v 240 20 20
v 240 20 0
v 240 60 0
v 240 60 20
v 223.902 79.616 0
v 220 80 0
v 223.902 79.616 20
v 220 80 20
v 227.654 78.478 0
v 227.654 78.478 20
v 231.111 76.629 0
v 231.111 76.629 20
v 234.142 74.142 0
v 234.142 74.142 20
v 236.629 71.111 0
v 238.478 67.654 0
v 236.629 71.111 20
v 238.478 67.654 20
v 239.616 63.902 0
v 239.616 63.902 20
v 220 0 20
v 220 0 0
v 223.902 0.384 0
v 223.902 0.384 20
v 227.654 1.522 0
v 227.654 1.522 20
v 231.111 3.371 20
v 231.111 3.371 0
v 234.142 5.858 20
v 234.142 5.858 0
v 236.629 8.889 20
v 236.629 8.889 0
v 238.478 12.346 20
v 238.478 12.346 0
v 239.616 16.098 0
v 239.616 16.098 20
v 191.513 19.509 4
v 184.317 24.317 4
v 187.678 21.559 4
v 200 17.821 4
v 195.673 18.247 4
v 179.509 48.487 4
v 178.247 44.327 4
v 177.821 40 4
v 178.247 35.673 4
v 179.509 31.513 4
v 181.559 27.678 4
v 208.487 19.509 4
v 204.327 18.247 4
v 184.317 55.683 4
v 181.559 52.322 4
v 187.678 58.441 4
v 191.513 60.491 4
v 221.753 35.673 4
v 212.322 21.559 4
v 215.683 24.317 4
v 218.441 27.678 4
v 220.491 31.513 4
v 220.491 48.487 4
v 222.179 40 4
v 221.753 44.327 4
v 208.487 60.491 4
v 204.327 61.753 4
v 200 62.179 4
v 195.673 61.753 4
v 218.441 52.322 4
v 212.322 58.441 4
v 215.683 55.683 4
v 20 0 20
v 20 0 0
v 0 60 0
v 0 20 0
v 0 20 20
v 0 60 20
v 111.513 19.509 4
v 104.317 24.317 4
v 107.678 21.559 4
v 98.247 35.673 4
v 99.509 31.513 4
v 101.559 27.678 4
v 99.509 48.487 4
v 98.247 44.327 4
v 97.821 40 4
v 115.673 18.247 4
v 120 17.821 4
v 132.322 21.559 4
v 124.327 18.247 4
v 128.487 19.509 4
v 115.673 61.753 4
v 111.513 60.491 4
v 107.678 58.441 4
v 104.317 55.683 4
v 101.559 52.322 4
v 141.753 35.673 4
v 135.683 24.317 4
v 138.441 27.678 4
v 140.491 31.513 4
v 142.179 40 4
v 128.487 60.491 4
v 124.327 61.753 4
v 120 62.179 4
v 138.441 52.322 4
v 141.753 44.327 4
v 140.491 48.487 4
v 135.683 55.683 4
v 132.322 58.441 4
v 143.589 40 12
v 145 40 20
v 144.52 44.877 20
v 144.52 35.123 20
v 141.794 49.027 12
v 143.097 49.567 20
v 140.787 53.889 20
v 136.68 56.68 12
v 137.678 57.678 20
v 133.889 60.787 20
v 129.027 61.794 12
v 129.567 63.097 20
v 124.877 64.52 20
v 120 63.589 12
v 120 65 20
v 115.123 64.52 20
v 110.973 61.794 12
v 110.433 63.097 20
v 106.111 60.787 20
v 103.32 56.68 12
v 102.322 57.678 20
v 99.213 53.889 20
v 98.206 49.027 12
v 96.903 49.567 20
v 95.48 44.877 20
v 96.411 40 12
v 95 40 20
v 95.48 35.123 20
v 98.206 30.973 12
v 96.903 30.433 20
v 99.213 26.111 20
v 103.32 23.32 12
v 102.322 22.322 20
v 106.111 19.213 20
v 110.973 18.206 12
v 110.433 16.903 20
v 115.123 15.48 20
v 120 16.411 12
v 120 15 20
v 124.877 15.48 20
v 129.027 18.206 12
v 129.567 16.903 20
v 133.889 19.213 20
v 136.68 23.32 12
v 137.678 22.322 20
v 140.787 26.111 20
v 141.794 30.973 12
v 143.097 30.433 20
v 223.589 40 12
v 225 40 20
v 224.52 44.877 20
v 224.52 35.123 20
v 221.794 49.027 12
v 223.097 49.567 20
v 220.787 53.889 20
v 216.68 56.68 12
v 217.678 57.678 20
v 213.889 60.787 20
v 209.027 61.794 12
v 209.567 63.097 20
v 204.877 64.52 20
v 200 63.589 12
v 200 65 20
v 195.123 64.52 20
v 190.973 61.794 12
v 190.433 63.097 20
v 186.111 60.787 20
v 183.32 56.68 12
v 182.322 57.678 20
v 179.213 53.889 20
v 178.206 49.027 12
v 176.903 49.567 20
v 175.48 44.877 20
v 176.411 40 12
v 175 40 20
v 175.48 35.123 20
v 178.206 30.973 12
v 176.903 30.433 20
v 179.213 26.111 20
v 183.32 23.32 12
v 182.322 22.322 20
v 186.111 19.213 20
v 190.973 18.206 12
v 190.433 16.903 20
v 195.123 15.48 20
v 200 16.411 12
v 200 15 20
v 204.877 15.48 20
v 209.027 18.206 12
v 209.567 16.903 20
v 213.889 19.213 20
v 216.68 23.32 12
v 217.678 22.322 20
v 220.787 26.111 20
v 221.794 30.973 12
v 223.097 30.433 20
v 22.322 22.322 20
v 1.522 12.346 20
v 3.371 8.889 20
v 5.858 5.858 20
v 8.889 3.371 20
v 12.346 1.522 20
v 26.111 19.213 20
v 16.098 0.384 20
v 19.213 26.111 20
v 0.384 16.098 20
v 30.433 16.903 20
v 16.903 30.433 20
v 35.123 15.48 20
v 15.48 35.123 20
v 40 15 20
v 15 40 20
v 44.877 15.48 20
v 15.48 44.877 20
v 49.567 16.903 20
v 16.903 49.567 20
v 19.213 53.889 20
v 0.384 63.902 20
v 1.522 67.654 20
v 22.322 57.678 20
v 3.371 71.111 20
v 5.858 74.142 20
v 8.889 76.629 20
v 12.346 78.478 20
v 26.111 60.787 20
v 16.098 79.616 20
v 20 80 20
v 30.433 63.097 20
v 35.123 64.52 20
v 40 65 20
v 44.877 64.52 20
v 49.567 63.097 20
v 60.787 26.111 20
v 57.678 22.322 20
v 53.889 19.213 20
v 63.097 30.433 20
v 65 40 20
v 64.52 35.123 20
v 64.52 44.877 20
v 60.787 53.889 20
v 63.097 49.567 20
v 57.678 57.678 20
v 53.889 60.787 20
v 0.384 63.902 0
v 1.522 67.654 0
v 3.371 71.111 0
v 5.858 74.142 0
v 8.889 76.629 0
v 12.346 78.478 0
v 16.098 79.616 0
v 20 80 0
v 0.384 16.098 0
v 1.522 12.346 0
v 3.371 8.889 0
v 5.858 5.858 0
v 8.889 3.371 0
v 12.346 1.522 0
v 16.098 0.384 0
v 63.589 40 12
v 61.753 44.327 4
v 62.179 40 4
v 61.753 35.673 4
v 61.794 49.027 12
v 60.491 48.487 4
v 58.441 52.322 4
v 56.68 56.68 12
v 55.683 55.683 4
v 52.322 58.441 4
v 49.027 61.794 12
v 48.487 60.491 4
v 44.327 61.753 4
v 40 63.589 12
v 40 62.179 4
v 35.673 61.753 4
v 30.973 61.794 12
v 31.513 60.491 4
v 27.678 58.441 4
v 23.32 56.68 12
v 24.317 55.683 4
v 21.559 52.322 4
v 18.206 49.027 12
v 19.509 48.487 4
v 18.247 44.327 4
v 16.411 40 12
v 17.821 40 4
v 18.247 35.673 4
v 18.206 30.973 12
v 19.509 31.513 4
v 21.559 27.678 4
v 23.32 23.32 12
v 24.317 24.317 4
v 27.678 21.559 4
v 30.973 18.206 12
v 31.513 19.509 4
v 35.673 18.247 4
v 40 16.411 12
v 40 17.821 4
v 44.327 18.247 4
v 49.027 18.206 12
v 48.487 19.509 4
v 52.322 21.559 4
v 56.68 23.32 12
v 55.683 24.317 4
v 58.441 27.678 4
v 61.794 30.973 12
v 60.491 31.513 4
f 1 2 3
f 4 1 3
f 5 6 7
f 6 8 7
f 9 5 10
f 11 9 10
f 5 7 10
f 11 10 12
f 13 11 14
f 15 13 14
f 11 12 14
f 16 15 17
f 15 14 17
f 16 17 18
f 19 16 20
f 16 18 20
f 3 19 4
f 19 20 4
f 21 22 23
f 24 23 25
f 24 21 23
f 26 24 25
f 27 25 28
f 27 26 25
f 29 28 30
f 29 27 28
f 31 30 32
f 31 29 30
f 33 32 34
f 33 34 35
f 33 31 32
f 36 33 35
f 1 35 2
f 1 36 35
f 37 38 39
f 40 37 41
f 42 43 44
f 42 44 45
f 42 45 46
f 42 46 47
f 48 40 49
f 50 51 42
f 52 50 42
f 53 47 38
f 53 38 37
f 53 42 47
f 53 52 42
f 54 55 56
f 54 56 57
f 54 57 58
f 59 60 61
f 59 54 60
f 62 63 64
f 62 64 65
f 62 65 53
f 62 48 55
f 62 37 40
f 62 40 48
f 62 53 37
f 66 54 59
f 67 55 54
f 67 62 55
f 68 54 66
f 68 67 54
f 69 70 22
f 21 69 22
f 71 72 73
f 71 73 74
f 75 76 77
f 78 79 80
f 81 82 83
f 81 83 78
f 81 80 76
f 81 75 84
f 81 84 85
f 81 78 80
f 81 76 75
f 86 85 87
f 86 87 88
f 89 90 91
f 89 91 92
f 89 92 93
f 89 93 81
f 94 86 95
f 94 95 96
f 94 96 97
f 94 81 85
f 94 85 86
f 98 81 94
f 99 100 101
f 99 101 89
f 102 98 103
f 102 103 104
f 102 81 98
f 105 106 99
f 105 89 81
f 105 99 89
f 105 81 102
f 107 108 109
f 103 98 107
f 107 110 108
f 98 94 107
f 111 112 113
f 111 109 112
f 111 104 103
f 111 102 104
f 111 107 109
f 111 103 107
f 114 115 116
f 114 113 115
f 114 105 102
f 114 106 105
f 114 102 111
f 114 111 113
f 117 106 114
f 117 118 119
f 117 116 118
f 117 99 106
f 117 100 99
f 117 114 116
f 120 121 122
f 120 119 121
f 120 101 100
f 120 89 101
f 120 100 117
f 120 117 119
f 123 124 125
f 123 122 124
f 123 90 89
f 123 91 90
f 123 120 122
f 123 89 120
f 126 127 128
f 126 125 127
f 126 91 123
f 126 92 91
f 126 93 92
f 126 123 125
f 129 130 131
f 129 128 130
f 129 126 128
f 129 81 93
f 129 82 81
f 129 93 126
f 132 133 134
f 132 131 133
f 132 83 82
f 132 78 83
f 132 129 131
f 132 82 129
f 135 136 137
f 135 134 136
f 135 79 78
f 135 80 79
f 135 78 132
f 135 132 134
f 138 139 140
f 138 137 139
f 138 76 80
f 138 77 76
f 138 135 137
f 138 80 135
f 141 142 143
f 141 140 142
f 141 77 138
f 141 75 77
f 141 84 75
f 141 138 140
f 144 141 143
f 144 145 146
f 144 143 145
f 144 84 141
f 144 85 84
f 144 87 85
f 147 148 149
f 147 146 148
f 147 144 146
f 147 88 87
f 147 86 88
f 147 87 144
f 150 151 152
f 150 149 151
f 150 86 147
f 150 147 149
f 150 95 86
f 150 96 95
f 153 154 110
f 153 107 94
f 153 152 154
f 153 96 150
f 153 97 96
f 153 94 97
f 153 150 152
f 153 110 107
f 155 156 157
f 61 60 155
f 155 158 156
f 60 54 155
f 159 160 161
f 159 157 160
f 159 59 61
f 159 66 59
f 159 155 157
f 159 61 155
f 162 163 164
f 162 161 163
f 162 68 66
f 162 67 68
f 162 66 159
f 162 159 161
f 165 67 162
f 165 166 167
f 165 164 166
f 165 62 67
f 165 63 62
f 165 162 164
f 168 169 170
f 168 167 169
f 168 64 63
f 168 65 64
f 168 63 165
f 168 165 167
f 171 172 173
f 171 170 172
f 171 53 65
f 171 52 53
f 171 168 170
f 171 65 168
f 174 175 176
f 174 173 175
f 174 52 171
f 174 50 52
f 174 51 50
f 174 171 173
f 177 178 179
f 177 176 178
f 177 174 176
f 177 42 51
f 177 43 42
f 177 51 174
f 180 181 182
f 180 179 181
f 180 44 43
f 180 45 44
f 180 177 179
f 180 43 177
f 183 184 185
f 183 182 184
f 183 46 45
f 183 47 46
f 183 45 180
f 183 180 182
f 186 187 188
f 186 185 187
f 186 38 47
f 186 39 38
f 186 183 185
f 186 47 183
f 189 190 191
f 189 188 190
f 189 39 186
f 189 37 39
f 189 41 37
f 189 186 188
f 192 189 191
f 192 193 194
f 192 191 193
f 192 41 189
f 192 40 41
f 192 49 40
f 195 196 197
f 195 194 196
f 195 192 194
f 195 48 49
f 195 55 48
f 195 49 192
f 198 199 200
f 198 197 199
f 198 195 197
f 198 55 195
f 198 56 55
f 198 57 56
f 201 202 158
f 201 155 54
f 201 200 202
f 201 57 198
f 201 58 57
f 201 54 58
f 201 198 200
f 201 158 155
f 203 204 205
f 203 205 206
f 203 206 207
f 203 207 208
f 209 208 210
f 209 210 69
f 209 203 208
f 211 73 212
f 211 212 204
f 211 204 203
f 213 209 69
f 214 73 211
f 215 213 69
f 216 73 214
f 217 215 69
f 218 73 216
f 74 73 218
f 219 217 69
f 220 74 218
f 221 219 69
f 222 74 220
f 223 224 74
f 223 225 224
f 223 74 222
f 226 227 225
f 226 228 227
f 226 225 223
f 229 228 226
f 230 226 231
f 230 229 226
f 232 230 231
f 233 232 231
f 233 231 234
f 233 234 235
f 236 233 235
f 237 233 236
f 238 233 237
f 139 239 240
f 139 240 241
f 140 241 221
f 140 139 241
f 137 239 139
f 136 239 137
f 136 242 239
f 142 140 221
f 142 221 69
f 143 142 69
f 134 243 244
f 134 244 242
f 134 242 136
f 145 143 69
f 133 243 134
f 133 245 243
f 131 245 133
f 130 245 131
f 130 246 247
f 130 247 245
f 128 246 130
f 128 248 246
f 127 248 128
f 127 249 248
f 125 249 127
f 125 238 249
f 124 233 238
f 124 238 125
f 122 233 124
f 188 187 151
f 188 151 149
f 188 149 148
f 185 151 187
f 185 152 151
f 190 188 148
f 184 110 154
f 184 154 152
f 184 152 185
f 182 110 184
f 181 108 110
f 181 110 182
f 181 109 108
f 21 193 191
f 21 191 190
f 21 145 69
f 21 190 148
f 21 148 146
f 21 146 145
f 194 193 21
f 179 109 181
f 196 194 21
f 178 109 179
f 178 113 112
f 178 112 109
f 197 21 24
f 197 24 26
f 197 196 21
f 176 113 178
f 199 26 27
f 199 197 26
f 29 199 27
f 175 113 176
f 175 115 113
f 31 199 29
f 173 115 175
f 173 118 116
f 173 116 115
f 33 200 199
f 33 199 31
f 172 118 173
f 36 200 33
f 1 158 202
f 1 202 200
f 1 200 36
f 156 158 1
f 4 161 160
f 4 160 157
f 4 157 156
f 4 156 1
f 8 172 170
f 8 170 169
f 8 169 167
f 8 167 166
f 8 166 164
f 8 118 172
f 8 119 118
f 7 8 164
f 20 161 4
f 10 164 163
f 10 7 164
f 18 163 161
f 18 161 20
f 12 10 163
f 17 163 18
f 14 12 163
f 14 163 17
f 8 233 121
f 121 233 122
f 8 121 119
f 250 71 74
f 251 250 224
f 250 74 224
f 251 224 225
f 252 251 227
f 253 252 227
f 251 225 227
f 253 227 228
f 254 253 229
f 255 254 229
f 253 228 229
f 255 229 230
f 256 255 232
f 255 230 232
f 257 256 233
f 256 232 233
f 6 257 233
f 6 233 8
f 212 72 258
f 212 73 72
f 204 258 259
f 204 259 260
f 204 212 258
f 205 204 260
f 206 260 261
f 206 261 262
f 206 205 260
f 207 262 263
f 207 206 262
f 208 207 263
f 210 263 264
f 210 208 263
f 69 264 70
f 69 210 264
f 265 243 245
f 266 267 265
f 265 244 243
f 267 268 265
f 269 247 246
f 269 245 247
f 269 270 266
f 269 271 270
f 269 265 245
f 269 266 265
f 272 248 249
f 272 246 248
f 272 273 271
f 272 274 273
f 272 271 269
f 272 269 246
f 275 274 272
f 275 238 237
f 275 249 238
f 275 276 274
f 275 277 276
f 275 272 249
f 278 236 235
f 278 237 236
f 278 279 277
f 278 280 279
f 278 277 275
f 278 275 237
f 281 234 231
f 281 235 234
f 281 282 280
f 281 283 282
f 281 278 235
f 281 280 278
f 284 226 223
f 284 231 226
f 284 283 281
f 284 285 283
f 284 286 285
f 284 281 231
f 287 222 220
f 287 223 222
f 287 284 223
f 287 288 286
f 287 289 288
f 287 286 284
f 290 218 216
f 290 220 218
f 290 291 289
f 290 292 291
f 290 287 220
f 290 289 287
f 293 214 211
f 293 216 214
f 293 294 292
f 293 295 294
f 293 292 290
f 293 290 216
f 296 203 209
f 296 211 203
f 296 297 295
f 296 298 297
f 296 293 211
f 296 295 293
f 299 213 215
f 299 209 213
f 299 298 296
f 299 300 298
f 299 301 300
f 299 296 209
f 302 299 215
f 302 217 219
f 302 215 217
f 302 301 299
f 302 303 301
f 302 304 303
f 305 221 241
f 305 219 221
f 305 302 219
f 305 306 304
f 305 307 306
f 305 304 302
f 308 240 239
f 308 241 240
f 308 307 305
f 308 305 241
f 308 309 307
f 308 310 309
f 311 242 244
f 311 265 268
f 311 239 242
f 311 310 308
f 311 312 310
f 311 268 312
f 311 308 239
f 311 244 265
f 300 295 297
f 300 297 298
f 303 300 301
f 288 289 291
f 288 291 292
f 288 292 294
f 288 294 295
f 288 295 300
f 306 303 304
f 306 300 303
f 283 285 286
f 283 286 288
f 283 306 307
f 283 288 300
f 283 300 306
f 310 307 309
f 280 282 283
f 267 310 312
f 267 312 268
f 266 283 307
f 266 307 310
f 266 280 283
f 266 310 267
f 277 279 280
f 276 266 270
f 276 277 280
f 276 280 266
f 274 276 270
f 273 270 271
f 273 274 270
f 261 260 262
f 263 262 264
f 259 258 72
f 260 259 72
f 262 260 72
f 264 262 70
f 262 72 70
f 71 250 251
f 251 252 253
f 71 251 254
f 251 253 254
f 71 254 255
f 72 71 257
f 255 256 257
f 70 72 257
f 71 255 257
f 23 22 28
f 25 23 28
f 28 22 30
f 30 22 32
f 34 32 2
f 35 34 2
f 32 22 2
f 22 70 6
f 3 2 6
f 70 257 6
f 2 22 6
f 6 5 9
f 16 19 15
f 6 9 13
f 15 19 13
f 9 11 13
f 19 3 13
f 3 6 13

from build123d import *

# Parameters (mm, degrees)
F0_W     = 240
F0_H     = 80
F1_DEPTH = 20
F2_R     = 25
F3_DEPTH = 16
F3_TAPER = 10
F4_R     = 20


with BuildPart() as f1:
    # F0 (on Top) → F1 (new body)
    with BuildSketch(Plane.XY):
        with Locations((120, 40)):
            Rectangle(F0_W, F0_H)
    extrude(amount=F1_DEPTH)

    # F2 (on face) → F3 (cut)
    with BuildSketch(Plane.XY.offset(20)):
        with Locations((40, 40)):
            Circle(F2_R)
        with Locations((120, 40)):
            Circle(F2_R)
        with Locations((200, 40)):
            Circle(F2_R)
    extrude(amount=-F3_DEPTH, taper=F3_TAPER, mode=Mode.SUBTRACT)

    # F4
    f4_edges = [f1.edges().sort_by_distance(p)[0] for p in [
        (240, 0, 10),
        (240, 80, 10),
        (0, 80, 10),
        (0, 0, 10),
    ]]
    fillet(f4_edges, radius=F4_R)


solid = f1.part
